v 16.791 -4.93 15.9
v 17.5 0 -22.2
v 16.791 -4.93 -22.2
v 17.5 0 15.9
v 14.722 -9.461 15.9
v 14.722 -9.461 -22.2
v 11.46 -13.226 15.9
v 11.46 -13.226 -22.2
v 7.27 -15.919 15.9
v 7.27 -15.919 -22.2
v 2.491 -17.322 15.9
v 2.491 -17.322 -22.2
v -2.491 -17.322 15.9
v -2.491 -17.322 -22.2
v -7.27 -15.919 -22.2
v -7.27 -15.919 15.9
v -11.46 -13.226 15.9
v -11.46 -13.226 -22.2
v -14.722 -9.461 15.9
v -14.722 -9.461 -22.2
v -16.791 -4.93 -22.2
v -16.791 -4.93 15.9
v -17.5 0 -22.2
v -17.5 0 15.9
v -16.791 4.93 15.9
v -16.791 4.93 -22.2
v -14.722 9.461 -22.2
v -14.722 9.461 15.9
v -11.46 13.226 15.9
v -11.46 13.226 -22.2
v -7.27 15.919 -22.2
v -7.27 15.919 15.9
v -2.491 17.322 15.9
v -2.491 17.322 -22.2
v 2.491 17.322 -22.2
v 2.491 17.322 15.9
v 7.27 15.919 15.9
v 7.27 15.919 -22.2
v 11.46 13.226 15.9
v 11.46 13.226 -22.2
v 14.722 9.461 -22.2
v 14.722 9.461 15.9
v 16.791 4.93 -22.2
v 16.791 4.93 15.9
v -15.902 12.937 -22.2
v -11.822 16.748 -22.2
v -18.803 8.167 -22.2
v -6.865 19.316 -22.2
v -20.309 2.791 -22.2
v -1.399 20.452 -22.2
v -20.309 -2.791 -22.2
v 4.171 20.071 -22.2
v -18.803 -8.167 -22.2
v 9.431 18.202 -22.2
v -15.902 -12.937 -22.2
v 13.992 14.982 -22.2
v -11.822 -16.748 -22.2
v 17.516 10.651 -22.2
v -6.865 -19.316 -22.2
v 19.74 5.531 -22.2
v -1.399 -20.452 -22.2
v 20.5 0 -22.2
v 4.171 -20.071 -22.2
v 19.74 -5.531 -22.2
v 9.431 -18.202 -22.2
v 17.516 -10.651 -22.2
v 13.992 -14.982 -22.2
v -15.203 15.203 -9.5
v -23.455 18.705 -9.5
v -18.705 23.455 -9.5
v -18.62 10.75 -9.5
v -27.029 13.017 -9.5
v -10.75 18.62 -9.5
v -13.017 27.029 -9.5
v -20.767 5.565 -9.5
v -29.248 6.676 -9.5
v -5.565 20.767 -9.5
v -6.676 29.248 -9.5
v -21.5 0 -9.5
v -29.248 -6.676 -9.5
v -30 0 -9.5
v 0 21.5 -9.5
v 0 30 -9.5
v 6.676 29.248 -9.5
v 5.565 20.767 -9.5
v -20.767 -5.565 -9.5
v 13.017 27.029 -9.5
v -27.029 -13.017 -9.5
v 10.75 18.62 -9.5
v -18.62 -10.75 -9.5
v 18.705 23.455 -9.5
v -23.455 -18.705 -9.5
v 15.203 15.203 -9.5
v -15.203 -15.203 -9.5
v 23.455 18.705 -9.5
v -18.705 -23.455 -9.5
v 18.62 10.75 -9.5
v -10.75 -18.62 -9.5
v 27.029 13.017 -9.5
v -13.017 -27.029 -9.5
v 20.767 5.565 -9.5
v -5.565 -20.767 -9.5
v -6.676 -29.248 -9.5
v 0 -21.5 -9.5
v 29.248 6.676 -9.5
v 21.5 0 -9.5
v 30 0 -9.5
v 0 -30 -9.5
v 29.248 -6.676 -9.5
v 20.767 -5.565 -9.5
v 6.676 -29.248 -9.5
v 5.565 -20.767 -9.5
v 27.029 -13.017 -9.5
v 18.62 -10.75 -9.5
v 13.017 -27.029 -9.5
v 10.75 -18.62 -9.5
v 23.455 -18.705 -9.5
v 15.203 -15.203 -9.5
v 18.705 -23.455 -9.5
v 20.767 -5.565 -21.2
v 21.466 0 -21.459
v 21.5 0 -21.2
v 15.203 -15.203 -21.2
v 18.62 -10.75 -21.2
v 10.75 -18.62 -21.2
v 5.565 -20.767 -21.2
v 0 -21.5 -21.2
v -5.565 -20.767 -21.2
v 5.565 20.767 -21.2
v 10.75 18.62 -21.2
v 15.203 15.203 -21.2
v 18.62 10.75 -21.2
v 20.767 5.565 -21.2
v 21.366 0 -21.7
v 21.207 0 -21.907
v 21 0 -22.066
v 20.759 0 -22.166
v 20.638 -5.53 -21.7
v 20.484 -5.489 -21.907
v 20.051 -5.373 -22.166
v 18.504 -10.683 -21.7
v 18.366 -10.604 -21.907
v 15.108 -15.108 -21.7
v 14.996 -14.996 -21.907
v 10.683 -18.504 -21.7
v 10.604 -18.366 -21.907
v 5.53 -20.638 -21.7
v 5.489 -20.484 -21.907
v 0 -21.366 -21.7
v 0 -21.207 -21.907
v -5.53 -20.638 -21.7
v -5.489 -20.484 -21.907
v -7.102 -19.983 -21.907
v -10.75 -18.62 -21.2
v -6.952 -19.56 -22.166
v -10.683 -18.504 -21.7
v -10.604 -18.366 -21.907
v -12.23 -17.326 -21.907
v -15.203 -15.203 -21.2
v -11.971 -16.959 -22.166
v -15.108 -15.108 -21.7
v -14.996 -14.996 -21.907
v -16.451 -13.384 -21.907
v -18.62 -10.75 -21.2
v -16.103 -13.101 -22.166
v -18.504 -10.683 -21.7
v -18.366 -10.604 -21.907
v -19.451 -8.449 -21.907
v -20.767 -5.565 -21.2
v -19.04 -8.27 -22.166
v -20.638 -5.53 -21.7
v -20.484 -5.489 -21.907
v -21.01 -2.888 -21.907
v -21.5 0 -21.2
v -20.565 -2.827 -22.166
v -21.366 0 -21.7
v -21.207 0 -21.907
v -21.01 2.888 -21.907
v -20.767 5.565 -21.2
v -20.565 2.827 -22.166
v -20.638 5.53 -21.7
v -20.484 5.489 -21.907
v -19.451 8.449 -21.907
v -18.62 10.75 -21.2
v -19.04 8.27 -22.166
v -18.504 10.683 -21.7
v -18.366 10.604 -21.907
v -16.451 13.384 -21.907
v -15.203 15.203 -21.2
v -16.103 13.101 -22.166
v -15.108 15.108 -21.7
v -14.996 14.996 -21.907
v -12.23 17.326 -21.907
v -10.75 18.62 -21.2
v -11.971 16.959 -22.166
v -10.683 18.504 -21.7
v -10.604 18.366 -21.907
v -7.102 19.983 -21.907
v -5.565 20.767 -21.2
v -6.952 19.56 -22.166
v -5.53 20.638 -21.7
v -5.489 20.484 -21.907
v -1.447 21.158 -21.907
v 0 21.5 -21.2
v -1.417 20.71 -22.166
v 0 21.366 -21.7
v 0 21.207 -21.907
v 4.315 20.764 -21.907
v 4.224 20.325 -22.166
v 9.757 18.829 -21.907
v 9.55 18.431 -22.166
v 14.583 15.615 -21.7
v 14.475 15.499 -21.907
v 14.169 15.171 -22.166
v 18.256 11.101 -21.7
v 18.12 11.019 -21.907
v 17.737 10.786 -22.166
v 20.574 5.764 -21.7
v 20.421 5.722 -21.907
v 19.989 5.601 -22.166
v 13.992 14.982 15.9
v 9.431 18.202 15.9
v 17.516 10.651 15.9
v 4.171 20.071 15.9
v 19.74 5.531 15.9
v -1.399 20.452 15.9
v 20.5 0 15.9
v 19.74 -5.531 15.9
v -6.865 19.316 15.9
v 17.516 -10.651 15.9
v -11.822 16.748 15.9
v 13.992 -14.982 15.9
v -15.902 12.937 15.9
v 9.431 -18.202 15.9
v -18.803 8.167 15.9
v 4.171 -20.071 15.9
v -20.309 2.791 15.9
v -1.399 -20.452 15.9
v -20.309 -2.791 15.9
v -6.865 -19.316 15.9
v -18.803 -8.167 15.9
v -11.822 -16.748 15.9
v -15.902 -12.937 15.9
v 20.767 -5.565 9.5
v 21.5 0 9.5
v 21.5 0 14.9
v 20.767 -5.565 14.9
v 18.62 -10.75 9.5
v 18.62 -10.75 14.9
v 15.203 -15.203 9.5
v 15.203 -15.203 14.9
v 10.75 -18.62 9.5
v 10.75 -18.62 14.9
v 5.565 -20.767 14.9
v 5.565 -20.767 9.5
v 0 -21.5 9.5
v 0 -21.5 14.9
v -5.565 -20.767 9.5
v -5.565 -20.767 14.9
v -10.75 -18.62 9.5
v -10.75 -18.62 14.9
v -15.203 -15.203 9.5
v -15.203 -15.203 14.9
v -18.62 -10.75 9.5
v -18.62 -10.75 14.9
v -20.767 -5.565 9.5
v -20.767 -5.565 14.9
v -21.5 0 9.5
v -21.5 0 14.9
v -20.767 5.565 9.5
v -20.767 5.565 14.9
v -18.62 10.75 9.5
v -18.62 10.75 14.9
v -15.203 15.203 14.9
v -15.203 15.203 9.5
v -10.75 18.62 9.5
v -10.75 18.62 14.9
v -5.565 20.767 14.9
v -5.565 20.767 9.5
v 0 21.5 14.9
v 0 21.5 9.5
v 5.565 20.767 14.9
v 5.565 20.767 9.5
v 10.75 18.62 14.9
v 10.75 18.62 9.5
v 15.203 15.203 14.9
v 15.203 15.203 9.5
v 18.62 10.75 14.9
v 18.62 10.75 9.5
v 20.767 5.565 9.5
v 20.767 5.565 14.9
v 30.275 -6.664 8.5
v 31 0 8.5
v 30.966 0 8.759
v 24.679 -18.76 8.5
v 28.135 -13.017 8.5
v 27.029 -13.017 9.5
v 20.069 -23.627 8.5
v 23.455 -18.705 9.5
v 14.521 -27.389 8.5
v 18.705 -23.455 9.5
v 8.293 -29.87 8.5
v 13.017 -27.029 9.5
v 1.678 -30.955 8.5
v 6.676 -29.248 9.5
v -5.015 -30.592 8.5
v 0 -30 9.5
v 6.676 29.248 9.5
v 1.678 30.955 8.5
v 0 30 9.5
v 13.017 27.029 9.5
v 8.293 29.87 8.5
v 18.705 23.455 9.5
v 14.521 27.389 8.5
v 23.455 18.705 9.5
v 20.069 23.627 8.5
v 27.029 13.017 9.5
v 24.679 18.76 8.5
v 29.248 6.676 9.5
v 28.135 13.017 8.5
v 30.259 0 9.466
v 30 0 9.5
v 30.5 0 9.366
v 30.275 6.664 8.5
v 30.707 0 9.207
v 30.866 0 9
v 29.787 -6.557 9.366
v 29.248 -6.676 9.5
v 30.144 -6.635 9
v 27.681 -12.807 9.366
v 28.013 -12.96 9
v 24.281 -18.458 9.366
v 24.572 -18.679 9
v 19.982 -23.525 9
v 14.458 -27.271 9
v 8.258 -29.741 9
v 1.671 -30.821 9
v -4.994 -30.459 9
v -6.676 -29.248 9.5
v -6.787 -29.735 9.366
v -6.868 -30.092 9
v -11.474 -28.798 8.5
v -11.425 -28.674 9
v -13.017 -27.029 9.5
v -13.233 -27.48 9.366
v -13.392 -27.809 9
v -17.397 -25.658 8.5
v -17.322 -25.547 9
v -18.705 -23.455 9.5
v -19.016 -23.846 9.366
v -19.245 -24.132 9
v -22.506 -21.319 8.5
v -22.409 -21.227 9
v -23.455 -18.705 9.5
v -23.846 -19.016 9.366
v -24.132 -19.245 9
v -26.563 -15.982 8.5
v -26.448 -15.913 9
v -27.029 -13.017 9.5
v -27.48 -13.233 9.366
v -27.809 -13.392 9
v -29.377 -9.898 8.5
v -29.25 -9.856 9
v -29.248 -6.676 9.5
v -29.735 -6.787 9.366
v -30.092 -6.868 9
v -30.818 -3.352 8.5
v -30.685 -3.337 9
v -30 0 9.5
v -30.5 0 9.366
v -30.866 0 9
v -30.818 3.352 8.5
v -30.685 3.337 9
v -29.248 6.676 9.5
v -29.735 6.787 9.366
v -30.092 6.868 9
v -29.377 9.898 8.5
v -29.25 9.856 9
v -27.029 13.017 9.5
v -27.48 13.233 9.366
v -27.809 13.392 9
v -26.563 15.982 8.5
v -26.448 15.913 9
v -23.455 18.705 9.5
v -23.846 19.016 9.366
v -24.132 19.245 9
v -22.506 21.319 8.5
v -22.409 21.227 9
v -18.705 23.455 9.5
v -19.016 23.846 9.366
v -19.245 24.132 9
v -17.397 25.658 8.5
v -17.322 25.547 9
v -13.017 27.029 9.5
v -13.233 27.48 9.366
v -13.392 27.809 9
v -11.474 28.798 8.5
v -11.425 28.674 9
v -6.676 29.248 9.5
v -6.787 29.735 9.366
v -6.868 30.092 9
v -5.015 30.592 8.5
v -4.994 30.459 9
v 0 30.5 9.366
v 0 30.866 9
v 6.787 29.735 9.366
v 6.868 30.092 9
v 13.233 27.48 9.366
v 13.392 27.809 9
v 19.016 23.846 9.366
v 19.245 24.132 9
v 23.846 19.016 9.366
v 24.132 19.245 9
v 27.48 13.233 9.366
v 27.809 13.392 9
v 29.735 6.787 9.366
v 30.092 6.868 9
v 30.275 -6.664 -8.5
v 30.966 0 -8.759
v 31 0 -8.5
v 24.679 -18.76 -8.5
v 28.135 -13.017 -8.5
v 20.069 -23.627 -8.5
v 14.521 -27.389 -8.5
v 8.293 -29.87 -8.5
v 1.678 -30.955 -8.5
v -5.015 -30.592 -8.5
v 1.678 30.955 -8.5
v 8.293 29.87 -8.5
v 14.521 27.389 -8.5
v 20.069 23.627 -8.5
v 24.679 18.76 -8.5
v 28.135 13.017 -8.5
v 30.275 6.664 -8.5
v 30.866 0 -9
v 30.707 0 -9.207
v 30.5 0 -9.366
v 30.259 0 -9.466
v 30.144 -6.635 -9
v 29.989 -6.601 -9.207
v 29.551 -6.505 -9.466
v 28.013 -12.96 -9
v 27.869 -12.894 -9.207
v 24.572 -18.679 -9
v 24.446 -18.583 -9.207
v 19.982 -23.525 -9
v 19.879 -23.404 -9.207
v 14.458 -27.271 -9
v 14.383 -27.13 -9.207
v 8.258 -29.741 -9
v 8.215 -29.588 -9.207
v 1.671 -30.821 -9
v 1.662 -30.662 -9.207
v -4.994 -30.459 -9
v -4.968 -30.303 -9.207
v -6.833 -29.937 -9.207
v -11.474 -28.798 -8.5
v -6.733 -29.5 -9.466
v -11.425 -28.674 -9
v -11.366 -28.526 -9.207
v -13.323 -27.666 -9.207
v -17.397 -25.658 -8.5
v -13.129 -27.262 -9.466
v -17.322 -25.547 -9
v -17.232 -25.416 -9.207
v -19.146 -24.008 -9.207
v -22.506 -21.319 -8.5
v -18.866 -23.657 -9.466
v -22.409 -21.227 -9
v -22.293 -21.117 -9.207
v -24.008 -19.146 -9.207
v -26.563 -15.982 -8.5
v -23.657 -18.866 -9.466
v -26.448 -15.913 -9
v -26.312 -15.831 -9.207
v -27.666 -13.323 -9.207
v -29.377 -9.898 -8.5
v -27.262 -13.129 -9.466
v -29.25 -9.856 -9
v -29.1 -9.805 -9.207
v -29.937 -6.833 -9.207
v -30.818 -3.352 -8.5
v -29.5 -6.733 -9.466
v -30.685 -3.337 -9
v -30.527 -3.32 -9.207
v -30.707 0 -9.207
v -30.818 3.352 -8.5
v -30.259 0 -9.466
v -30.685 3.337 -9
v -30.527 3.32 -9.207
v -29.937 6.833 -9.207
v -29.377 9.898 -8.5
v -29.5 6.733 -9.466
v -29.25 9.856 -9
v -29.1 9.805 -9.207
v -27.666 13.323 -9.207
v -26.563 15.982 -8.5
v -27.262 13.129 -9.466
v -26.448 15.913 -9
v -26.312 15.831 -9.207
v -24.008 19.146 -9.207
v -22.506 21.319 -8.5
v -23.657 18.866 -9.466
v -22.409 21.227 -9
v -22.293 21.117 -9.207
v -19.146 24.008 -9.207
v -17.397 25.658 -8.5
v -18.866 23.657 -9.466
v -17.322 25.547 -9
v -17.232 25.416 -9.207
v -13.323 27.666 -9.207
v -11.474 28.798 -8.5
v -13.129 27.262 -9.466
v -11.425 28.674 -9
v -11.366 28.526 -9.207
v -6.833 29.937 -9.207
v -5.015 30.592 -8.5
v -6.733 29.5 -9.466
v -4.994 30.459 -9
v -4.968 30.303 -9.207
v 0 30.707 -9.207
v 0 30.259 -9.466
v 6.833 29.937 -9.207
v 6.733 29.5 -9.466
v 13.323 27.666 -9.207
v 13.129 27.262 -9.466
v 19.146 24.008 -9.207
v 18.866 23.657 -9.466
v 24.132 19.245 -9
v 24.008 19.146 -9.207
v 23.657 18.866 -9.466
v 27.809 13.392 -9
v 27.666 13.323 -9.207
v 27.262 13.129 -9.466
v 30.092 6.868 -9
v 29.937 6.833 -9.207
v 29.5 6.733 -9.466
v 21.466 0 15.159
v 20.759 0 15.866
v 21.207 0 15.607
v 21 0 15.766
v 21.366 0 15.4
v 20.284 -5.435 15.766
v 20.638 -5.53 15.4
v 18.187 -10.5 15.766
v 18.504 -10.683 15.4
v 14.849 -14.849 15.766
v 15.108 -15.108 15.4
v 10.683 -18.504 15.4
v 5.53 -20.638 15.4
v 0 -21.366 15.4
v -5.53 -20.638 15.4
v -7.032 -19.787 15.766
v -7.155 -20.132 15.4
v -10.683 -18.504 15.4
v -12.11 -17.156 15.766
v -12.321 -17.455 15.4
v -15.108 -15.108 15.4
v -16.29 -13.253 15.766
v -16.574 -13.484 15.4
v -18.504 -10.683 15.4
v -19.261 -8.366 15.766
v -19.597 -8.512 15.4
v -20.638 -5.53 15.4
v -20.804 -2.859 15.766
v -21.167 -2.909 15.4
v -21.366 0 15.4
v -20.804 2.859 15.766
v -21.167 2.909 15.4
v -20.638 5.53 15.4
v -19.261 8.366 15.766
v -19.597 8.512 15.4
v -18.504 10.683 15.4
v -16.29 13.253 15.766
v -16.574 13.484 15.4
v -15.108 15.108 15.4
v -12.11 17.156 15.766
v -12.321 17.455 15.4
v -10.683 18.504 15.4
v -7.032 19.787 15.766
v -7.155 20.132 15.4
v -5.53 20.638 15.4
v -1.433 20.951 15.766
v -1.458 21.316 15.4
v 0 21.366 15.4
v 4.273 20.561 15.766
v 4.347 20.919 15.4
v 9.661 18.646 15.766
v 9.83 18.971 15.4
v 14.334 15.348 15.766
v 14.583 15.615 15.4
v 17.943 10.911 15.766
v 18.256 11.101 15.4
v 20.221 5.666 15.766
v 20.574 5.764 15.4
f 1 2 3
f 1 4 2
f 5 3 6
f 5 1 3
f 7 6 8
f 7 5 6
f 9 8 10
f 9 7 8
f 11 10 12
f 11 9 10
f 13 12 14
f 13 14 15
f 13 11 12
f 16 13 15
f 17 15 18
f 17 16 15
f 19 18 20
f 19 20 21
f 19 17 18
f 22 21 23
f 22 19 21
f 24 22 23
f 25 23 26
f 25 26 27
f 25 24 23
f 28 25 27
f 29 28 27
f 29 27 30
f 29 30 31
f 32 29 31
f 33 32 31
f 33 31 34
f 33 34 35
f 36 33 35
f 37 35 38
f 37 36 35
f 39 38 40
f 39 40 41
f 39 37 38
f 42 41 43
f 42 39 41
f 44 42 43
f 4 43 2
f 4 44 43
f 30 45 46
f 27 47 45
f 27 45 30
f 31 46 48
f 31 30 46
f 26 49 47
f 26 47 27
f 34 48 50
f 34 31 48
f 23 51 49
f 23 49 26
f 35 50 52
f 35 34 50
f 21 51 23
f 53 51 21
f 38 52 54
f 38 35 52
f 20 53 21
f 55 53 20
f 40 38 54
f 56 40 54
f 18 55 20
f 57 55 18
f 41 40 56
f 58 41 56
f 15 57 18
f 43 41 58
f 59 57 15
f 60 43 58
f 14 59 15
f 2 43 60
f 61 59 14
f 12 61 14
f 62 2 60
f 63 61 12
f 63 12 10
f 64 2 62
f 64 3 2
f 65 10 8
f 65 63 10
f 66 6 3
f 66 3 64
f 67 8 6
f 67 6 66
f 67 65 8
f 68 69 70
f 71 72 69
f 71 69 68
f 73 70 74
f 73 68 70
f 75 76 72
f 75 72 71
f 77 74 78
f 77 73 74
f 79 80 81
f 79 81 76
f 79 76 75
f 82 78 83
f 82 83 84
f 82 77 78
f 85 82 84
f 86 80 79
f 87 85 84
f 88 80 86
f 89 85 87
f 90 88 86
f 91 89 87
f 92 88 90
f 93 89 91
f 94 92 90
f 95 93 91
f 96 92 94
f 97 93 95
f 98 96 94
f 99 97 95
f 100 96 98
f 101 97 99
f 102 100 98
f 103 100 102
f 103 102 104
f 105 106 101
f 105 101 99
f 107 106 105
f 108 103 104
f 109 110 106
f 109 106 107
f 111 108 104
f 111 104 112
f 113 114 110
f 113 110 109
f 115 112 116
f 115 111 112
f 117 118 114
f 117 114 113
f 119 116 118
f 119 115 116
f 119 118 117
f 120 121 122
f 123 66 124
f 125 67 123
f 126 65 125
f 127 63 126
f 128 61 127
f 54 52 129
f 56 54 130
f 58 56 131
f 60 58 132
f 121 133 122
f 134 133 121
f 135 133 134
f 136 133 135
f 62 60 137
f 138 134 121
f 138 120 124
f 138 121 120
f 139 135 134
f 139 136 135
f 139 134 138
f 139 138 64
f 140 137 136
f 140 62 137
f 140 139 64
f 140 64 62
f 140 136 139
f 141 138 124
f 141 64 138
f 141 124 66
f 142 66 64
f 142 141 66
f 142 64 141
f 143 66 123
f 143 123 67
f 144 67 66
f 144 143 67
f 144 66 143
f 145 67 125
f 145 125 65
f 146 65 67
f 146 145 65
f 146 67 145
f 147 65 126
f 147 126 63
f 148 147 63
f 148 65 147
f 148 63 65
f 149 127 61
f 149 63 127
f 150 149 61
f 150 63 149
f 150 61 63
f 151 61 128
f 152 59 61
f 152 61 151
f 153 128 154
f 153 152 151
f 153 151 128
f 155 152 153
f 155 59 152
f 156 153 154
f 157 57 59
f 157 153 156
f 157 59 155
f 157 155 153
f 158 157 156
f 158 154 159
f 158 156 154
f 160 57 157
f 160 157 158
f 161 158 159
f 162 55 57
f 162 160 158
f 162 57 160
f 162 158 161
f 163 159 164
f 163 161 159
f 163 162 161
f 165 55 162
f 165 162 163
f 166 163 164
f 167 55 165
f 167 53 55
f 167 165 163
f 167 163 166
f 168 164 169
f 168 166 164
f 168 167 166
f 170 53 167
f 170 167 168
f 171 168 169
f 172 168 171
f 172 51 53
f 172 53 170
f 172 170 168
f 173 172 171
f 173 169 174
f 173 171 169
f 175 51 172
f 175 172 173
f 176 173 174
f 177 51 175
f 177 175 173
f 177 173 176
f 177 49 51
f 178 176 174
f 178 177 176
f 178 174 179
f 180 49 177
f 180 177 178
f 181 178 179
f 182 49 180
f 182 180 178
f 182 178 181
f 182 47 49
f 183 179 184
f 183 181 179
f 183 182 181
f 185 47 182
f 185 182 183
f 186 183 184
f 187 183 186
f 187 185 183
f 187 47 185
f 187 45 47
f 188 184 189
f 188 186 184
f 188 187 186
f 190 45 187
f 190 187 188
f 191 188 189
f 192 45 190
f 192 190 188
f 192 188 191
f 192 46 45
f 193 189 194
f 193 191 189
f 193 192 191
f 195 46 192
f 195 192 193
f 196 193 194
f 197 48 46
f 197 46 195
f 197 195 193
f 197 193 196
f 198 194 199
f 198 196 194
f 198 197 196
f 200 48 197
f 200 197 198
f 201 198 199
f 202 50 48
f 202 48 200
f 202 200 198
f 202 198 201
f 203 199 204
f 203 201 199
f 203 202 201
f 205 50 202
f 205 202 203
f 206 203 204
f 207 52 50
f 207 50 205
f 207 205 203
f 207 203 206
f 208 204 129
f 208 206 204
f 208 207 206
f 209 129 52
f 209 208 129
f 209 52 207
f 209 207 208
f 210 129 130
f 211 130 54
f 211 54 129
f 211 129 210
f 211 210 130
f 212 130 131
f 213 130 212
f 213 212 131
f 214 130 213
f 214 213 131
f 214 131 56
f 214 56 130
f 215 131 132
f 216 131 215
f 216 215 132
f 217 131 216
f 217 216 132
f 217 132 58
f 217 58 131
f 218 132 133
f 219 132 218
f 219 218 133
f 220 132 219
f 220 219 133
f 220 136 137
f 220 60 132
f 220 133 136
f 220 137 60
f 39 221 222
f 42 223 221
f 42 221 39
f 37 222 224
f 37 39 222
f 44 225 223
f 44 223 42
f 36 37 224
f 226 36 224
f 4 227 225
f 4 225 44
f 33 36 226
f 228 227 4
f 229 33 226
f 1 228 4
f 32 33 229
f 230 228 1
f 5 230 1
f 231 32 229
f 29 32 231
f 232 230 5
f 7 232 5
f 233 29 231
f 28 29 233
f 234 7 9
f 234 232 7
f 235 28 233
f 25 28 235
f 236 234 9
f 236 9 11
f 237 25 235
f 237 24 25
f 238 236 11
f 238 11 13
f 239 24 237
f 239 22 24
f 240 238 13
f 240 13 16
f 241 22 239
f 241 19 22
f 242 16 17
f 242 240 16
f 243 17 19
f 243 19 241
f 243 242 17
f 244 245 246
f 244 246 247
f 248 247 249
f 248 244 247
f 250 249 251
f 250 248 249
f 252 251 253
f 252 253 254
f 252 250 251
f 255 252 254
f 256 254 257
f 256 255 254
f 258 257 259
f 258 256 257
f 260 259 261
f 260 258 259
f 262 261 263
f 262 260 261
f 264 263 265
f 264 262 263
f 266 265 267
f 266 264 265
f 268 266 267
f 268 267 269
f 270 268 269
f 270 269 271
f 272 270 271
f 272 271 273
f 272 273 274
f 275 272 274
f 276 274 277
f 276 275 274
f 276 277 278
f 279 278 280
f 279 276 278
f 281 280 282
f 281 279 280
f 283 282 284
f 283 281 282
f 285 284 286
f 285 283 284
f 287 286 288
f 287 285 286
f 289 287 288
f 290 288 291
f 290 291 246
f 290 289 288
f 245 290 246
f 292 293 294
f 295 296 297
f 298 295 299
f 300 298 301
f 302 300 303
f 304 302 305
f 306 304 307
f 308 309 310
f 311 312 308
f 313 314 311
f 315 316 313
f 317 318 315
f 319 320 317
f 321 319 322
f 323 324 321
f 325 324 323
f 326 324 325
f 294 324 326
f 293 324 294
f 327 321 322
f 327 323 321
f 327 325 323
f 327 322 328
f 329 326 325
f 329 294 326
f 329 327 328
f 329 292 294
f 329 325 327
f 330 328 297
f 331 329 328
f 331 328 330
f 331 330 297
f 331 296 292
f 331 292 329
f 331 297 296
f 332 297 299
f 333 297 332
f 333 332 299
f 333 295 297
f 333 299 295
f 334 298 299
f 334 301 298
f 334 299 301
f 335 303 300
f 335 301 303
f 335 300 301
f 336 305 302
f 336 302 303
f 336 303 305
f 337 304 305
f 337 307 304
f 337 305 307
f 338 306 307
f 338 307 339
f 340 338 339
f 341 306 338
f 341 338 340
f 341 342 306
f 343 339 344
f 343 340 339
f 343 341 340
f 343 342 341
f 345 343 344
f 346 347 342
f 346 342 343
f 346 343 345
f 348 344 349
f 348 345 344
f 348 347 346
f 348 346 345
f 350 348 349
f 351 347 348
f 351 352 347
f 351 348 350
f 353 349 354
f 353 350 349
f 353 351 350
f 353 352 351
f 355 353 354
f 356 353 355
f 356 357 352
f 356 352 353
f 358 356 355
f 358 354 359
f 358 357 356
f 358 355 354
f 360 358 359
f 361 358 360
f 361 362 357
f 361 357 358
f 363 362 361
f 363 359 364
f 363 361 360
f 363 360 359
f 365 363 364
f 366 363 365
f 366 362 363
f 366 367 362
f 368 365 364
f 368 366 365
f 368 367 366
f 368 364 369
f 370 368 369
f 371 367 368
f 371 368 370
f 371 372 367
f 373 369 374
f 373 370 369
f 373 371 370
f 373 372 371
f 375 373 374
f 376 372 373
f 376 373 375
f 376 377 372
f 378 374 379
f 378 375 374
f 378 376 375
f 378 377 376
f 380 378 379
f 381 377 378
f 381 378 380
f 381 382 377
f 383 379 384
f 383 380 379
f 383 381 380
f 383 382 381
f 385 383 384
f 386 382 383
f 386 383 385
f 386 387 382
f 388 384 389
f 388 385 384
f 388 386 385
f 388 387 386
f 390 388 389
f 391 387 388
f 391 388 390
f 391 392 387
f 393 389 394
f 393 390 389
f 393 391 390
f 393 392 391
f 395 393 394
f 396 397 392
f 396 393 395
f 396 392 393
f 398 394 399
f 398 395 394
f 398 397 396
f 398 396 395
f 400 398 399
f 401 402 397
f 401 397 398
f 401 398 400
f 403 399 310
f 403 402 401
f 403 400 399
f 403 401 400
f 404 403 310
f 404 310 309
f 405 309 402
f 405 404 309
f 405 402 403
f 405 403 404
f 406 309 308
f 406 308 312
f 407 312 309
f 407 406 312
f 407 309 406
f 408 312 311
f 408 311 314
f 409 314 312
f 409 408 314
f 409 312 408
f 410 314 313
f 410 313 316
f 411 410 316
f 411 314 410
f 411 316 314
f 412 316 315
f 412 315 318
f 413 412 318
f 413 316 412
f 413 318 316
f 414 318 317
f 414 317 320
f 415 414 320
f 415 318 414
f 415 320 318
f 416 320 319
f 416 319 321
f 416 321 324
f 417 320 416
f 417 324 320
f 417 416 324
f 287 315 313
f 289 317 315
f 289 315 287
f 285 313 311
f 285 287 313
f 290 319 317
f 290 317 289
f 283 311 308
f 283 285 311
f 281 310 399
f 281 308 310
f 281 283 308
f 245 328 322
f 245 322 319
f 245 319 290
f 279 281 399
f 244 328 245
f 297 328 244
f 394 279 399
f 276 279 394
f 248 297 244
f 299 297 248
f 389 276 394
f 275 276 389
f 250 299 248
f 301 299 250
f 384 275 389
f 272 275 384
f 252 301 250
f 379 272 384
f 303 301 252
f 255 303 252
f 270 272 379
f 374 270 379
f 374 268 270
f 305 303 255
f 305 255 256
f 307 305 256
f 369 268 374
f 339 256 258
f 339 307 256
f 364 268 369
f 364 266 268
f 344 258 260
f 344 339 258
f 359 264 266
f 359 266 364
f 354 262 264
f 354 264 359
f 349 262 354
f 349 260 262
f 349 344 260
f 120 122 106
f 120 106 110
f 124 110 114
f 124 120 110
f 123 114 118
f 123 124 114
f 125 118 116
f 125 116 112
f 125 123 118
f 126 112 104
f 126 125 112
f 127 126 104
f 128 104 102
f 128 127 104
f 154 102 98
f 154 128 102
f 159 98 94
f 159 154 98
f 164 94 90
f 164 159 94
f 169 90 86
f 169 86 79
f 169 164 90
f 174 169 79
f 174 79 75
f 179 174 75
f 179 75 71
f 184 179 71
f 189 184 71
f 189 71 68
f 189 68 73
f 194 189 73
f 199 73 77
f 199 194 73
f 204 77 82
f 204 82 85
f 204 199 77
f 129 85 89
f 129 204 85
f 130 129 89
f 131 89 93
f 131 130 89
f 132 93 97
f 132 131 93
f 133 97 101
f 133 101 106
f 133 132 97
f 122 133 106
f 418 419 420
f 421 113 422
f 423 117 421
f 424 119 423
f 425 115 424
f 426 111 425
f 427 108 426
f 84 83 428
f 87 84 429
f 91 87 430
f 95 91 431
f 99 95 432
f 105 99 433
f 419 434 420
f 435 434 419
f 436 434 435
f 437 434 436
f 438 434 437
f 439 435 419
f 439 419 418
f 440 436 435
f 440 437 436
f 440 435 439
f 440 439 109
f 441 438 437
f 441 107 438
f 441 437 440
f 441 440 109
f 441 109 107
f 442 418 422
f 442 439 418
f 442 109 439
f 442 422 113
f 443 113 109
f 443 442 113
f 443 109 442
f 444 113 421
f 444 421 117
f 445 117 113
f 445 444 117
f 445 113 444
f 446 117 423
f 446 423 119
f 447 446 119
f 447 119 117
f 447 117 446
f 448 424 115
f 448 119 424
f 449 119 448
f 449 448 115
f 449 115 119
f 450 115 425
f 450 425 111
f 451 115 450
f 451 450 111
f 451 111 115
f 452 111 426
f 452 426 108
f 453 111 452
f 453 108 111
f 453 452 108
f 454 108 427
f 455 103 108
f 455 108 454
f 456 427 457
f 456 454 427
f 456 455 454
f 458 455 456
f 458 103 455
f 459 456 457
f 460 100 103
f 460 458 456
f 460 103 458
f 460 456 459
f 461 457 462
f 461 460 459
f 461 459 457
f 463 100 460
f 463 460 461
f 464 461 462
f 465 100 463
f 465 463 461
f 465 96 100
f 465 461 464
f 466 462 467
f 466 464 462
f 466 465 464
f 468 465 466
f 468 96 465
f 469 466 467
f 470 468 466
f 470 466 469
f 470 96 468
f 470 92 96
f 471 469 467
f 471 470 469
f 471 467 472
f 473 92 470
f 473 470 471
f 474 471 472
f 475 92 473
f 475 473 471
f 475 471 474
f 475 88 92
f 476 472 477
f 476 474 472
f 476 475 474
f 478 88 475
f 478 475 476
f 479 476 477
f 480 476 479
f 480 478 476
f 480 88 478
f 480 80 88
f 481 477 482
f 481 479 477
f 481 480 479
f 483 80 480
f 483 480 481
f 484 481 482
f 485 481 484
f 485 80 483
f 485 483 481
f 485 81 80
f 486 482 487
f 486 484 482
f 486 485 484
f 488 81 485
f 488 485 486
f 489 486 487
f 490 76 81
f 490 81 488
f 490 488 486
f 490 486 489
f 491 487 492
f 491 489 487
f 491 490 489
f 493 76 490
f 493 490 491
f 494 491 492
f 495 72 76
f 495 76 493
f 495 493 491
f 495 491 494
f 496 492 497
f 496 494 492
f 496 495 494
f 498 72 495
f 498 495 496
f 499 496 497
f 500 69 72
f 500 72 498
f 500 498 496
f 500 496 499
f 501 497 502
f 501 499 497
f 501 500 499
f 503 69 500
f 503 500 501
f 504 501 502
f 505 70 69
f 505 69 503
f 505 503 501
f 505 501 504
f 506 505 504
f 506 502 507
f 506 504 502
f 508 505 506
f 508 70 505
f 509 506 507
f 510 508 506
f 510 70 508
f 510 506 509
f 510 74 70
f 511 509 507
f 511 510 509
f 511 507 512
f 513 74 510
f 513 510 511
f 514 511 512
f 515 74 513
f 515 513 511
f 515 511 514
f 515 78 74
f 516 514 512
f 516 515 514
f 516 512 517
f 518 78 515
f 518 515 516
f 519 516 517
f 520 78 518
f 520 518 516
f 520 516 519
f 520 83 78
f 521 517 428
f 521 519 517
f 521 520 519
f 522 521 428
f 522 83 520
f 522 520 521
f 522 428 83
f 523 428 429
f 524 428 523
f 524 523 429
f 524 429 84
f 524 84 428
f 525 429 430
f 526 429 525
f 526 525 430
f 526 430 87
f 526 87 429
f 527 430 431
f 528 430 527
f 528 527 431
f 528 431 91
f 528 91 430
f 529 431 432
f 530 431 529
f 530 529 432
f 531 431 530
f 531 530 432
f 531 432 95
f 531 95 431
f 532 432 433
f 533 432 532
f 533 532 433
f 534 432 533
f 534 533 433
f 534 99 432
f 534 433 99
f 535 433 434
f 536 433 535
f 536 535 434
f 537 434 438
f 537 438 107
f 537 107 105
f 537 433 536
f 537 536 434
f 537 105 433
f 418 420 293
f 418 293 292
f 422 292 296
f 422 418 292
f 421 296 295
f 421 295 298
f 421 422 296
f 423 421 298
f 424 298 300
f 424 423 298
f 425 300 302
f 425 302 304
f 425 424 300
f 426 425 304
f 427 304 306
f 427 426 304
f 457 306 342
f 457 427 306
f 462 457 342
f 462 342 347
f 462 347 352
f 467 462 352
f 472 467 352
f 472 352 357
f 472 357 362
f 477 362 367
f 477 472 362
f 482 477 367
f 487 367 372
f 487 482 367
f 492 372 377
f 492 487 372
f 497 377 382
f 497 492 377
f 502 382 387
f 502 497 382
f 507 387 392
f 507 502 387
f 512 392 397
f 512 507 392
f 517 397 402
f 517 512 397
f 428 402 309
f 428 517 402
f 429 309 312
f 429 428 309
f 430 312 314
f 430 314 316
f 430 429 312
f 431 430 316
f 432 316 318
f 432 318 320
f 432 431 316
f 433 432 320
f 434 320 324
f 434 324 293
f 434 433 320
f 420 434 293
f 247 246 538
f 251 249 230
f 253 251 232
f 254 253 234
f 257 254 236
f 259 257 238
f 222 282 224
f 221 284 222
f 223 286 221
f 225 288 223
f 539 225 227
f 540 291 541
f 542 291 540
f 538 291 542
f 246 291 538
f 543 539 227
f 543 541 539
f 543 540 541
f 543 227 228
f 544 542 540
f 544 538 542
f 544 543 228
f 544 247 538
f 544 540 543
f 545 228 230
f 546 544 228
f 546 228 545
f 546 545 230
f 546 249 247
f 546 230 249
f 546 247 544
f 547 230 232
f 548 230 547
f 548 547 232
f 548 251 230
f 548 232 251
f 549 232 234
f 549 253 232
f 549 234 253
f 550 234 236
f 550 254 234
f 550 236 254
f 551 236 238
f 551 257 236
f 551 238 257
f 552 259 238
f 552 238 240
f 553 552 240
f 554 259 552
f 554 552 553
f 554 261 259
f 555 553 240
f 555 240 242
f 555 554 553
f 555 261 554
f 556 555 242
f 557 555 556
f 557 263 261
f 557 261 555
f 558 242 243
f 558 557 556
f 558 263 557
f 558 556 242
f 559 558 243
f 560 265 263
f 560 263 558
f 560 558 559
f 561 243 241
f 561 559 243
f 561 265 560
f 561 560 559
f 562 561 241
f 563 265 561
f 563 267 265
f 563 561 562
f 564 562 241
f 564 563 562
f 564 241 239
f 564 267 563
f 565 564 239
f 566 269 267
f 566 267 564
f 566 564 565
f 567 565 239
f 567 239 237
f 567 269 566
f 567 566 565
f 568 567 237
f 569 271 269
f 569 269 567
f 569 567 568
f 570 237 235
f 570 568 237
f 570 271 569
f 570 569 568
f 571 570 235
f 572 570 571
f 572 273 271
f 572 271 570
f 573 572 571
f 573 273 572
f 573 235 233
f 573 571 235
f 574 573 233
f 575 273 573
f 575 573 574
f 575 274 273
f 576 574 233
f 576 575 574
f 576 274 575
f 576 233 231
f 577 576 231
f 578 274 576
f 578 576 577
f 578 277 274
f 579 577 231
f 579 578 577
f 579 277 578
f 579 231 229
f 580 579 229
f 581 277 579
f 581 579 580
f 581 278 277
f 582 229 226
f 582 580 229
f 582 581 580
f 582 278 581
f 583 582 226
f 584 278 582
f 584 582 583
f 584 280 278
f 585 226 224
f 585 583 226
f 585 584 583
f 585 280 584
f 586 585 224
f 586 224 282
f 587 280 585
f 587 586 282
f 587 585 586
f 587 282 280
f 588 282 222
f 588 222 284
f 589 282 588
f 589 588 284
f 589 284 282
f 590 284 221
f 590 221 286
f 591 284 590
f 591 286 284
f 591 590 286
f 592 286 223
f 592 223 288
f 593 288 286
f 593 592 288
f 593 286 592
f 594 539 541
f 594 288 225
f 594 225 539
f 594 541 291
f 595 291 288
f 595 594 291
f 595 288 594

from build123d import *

# Parameters (mm, degrees)
ZAOKR_GLENIE1_R = 1


with BuildPart() as part:
    # Szkic2 → Obrót1 (revolve)
    with BuildSketch(Plane(origin=(0, 0, 0), x_dir=(0, 0, -1), z_dir=(1, 0, 0)), mode=Mode.PRIVATE) as obr_t1_sk:
        Polygon((-9.5, 21.5), (-9.5, 31), (9.5, 31), (9.5, 21.5), (22.2, 21.5), (22.2, 17.5), (-15.9, 17.5), (-15.9, 21.5), align=None)
    revolve(obr_t1_sk.sketch.rotate(Axis((0, 0, 23.470588235), (0, 0, -1)), 90), axis=Axis((0, 0, 23.470588235), (0, 0, -1)))

    # Zaokrąglenie1
    zaokr_glenie1_edges = [part.edges().sort_by_distance(p)[0] for p in [
        (-21.5, 0, 15.9),
        (-31, 0, 9.5),
        (-31, 0, -9.5),
        (-21.5, 0, -22.2),
    ]]
    fillet(zaokr_glenie1_edges, radius=ZAOKR_GLENIE1_R)


solid = part.part
